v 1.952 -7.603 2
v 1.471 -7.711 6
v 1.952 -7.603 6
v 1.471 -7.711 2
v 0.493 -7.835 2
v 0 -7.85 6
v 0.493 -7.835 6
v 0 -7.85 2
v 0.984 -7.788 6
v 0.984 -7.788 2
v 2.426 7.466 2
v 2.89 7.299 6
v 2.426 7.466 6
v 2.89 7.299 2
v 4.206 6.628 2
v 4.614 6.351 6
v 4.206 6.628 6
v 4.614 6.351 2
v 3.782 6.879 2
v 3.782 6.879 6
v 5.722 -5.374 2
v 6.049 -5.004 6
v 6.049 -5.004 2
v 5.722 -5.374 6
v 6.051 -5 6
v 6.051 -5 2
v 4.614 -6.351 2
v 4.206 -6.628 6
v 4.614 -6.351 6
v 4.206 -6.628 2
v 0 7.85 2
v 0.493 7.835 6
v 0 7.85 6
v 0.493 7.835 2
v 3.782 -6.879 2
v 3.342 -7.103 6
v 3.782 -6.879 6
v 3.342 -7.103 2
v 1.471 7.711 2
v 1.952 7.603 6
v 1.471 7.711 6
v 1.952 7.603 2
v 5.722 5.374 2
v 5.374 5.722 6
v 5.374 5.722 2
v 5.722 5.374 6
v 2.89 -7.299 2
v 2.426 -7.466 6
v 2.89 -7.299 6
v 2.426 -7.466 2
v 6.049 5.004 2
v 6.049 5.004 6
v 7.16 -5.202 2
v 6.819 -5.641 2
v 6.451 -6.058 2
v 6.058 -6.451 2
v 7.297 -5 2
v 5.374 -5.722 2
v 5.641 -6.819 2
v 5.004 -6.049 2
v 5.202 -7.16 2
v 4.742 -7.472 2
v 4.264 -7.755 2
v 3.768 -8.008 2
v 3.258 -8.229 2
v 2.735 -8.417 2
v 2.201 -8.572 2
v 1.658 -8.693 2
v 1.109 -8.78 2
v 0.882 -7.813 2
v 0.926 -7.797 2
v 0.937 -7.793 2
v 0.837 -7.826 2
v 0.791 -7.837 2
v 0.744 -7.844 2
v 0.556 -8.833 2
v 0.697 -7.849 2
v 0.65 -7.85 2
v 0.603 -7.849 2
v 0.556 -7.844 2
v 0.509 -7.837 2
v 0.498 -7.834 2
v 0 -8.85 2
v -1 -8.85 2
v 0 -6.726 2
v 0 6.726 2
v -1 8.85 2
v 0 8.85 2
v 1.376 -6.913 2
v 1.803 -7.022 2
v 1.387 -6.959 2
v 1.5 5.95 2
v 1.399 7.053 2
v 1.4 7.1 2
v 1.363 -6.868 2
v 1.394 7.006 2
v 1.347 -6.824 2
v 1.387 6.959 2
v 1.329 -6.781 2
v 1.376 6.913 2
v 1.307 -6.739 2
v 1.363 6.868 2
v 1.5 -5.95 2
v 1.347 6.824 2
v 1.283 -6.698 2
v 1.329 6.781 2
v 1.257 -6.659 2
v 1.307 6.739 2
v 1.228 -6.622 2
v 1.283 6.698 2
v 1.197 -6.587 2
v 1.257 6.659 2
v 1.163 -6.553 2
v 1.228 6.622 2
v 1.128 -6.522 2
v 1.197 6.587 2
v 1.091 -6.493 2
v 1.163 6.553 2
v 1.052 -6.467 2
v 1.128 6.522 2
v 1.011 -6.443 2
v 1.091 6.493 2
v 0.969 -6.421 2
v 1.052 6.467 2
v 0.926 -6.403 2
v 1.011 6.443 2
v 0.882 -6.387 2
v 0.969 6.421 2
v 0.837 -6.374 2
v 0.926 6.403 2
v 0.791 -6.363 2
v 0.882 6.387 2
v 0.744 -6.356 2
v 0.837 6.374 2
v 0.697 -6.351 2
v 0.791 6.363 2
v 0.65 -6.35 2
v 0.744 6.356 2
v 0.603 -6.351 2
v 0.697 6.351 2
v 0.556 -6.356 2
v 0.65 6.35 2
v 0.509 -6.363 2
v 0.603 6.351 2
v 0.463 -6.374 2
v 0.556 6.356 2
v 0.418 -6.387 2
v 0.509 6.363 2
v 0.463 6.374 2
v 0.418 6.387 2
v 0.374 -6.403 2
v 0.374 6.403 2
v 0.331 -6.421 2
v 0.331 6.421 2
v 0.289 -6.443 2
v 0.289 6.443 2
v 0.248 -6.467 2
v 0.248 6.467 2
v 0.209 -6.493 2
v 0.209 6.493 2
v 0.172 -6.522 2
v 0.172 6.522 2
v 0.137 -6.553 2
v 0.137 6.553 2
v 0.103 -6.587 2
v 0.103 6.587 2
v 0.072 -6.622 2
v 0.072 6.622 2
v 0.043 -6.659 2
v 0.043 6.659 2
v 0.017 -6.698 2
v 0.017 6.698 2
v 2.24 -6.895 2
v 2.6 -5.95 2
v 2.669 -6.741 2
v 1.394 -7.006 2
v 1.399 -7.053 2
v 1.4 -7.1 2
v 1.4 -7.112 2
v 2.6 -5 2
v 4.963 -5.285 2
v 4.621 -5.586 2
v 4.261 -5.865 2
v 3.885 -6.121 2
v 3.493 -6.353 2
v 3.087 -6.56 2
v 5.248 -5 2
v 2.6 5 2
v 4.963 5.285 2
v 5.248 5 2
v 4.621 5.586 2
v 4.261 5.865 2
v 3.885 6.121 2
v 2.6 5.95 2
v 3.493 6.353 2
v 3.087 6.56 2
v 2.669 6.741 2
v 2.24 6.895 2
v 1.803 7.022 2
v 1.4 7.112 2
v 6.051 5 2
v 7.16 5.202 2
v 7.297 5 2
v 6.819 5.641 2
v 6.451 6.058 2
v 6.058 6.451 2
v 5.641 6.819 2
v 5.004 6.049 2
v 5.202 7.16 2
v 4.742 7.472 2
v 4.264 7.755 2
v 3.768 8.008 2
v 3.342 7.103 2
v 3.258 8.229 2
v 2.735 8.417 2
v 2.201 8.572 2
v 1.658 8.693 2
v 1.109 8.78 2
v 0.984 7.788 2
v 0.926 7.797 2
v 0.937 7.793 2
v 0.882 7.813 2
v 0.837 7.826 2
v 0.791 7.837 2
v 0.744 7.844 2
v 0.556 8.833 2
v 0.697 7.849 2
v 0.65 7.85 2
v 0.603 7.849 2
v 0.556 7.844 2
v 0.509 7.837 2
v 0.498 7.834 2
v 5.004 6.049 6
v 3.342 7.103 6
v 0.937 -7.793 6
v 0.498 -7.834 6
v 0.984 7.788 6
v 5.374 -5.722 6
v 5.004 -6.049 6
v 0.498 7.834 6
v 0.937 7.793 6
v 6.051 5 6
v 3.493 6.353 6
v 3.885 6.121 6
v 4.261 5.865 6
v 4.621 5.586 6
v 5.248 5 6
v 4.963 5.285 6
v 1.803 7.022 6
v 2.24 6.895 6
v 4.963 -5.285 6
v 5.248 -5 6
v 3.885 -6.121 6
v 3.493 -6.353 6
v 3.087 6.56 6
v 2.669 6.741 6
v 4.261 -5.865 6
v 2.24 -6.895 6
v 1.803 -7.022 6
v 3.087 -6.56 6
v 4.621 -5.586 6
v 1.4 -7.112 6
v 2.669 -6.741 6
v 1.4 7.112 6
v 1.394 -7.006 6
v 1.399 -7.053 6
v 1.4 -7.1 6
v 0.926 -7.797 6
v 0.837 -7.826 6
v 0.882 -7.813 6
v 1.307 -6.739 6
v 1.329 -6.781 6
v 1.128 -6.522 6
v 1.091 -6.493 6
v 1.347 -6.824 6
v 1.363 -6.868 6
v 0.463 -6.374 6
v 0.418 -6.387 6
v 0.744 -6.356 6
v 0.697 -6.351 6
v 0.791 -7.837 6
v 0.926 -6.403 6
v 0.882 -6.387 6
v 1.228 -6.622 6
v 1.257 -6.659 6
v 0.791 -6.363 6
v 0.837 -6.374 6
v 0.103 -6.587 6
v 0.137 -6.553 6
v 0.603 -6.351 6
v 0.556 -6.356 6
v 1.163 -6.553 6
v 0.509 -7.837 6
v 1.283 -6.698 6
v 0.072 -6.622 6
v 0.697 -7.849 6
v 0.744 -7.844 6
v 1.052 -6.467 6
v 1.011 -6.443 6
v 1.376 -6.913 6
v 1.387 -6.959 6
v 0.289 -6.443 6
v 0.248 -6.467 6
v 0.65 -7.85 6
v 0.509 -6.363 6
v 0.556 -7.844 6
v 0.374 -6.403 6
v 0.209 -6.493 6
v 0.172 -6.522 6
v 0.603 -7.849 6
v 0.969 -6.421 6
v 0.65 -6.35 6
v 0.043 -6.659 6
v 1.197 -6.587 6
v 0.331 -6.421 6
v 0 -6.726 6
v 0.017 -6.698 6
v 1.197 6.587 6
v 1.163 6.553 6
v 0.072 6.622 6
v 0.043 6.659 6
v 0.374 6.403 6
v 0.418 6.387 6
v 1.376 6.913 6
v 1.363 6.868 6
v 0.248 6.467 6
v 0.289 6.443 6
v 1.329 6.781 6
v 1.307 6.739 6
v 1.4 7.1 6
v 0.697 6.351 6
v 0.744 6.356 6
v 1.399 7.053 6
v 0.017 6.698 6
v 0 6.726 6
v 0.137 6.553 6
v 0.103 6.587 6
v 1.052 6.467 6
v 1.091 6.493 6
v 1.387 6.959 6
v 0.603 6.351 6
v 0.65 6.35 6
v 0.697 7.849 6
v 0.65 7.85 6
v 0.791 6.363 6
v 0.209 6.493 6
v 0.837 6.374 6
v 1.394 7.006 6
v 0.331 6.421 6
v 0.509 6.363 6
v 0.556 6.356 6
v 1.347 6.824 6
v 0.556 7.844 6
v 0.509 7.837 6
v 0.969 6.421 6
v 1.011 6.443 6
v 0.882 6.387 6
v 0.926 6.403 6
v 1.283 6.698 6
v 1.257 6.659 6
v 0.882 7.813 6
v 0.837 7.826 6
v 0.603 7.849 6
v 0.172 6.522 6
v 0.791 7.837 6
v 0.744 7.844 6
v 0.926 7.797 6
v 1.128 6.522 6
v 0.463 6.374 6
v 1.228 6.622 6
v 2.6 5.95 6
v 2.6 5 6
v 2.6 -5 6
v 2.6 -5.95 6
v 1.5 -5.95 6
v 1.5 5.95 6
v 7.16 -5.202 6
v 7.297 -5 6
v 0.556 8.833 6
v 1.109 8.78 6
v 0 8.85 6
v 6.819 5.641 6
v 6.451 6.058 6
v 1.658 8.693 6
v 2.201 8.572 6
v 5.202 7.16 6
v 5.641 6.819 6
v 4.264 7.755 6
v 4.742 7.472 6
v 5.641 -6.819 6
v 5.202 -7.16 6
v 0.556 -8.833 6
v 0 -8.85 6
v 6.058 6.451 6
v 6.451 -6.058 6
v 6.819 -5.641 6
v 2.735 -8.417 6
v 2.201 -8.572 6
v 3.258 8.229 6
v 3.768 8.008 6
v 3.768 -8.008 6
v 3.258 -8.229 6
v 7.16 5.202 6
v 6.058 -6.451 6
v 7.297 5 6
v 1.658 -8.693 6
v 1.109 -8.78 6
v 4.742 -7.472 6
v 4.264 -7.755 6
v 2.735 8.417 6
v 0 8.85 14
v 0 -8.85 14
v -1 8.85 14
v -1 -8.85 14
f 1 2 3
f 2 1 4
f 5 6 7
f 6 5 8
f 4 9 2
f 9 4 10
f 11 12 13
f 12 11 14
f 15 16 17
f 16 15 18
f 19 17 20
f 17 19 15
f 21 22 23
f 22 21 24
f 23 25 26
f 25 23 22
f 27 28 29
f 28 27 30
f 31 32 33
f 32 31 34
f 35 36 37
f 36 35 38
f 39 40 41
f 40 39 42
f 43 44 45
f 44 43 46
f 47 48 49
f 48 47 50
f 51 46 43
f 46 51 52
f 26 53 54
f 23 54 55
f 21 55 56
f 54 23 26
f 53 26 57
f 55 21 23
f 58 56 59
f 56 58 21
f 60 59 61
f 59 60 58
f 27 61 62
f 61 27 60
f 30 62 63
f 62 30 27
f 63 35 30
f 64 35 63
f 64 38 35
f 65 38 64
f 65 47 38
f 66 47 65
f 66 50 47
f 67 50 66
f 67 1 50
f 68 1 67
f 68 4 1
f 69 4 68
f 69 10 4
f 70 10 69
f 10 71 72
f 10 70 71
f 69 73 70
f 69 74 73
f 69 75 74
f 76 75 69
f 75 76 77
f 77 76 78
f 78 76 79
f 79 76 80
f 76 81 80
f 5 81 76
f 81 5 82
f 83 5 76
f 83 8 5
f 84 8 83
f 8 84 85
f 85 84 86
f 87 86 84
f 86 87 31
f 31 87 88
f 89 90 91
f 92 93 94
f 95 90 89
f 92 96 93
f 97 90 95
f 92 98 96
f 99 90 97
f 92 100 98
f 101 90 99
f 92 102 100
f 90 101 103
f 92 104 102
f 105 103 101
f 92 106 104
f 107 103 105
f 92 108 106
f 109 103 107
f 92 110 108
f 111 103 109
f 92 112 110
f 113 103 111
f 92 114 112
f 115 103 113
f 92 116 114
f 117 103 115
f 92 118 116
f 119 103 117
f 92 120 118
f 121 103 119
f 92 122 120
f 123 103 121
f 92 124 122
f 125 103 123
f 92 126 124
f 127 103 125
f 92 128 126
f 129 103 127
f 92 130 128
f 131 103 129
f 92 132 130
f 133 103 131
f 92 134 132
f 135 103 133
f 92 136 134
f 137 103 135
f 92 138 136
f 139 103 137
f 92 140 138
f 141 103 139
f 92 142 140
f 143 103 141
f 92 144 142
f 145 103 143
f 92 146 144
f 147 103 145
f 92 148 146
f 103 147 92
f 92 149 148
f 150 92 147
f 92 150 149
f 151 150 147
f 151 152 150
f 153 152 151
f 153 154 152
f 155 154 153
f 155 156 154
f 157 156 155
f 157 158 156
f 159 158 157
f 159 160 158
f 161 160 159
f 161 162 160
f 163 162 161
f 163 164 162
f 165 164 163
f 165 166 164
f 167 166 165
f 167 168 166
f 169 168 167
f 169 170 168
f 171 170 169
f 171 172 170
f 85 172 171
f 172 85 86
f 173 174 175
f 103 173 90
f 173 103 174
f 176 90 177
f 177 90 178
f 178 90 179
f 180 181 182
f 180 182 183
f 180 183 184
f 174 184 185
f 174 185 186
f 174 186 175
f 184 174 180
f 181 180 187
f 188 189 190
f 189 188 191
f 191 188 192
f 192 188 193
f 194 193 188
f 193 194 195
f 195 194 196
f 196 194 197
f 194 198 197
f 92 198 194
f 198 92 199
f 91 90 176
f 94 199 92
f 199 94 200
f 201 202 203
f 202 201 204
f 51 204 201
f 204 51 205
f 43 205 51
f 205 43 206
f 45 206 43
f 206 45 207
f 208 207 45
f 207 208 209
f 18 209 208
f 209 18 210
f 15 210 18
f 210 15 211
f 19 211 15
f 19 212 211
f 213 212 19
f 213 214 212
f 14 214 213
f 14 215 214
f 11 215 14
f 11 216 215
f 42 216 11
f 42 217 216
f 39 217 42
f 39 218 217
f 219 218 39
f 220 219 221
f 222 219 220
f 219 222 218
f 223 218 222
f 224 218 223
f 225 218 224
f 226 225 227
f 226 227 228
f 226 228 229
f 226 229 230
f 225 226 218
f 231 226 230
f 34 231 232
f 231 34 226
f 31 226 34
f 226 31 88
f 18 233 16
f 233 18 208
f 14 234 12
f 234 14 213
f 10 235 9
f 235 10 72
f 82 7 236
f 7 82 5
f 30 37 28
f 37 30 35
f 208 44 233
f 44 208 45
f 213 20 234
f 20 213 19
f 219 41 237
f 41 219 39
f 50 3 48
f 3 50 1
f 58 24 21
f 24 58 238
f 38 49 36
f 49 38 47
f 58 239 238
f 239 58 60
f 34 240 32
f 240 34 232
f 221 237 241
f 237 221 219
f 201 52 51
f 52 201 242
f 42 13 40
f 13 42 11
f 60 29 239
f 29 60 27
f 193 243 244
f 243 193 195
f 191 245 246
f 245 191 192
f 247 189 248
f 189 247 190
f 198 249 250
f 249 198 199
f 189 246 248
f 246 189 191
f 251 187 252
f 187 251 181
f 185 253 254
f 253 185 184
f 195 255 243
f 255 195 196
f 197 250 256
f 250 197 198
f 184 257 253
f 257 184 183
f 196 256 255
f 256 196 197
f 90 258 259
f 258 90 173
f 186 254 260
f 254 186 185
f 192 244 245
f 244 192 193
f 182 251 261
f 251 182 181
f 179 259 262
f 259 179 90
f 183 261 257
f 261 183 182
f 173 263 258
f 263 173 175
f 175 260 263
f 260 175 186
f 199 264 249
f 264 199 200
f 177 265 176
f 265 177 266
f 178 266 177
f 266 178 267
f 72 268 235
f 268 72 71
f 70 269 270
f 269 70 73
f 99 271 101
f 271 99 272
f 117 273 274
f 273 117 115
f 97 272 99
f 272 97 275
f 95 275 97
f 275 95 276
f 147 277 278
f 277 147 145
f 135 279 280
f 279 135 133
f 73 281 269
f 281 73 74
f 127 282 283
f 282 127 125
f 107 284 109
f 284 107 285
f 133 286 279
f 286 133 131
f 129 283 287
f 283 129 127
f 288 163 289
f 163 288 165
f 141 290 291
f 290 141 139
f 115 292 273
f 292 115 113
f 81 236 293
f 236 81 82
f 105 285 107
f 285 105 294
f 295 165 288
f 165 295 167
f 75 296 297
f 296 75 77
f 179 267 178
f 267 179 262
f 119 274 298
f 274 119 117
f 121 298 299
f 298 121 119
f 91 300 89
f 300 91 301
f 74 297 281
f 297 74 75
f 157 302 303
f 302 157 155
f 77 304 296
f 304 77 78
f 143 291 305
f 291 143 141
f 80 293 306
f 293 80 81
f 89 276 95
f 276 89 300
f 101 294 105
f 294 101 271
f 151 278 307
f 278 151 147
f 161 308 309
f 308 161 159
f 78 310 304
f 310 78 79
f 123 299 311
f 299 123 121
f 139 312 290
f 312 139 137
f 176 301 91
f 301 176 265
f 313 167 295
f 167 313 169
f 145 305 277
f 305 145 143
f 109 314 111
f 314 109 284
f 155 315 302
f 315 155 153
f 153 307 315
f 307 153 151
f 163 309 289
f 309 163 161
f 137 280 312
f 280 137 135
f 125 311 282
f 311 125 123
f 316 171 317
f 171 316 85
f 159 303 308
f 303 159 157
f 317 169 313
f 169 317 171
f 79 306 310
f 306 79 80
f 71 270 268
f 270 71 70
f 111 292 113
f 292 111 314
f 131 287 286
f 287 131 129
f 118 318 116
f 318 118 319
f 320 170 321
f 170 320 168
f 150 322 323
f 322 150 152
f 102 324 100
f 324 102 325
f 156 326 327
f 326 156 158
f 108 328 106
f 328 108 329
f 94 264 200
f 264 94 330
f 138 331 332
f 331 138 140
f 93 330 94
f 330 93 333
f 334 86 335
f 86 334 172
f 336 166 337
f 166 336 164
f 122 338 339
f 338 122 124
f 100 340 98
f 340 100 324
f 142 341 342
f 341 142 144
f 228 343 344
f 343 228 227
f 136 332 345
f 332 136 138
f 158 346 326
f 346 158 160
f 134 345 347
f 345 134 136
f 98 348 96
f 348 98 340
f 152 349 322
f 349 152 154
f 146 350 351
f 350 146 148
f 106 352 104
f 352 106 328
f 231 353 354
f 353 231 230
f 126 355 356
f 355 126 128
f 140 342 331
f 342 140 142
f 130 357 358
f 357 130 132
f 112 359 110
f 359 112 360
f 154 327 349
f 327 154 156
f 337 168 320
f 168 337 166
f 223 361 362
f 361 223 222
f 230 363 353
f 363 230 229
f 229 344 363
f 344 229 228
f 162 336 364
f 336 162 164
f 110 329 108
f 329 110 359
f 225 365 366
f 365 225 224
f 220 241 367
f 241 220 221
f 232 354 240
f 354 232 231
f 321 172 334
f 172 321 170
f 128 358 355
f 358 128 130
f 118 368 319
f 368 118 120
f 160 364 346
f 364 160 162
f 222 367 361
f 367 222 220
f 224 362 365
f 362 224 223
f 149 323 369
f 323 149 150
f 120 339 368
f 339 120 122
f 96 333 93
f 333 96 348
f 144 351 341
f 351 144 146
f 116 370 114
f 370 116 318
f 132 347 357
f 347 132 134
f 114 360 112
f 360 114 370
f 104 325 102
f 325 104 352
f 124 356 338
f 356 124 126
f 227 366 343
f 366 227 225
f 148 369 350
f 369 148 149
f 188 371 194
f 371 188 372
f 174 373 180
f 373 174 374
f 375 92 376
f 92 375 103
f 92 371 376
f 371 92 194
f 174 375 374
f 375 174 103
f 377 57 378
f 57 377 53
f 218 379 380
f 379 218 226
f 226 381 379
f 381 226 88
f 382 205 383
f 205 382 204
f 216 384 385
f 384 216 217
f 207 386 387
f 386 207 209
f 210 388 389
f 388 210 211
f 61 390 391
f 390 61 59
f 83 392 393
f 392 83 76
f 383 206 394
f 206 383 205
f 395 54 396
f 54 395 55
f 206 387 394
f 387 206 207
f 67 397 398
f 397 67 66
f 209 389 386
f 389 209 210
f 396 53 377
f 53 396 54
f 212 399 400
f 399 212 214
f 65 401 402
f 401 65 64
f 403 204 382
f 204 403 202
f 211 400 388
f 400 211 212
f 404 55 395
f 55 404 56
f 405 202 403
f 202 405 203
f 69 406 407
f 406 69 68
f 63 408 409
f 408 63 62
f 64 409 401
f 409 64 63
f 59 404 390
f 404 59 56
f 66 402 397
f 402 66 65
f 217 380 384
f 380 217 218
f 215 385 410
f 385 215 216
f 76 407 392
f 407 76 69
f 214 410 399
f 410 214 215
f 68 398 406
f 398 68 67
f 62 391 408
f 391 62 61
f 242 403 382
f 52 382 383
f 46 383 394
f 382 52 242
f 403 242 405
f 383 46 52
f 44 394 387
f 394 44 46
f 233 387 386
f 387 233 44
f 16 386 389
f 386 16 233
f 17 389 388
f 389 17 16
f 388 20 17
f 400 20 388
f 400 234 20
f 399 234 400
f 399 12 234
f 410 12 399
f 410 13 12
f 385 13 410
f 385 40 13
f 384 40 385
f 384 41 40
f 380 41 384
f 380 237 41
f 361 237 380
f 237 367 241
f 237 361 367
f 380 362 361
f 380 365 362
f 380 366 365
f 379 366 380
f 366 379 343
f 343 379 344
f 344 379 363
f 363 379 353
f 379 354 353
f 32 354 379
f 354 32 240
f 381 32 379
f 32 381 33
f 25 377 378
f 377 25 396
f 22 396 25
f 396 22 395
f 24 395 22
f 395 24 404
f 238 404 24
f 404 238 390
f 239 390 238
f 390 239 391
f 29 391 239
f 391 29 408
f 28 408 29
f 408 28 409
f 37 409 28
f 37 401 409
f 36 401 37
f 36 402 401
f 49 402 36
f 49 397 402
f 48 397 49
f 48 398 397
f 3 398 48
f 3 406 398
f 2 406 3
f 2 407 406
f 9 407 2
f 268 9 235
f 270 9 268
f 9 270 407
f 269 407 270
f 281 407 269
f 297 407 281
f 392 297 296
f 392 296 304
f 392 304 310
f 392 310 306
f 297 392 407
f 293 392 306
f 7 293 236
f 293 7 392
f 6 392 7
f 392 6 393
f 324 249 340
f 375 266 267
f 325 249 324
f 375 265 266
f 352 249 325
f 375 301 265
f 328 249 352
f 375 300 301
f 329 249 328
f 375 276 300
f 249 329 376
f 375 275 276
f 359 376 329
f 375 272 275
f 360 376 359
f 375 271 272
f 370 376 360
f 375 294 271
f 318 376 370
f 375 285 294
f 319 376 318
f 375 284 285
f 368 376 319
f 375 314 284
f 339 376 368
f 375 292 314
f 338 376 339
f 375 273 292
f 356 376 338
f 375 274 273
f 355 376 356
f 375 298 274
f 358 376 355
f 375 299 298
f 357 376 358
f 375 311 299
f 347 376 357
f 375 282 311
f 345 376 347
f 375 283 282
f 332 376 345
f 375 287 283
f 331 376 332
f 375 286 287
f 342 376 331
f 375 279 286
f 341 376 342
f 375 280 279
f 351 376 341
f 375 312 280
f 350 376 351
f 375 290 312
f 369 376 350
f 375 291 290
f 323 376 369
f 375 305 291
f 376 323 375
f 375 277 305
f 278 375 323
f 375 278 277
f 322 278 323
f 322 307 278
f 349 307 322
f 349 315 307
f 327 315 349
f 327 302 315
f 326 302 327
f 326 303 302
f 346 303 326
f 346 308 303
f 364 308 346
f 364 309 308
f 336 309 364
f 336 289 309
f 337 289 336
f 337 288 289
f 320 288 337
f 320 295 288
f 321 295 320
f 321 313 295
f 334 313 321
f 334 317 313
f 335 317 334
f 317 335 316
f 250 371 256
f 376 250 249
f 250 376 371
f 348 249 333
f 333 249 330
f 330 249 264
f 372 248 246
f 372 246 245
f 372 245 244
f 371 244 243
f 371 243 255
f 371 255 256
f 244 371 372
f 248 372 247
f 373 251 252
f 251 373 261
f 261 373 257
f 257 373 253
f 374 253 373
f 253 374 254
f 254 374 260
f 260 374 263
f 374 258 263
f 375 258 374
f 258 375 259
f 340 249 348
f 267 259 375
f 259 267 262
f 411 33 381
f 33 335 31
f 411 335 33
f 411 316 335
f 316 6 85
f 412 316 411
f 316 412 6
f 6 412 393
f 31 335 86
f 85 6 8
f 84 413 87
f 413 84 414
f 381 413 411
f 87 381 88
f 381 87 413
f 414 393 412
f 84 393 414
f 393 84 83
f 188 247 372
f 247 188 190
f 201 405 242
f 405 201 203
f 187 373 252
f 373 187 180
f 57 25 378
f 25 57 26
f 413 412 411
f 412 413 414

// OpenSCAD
$fn=100;
ledBoardY = 11.9;
ledBoardX = 1.1;
ledBoardXoffset = 1.5;

wireY = 6.8;
wireX = 2;

cacheDiam = 15.7;
cacheThick = 1.2;
cacheEdgeDiam = 1.5;

bottomZ = 6;
bottomY = cacheDiam + 2;

backPlate = 1;

baseZ = 6;

/*
rampWireBottom();
translate([0, 30, 0])
  rampBottom();
*/
rampMiddle();

module rampMiddle() {
  ledY = 10;
  difference() {
    rampBottom();
    translate([ledBoardXoffset + ledBoardX, -ledY/2, 0])
      cube([10, ledY, 10]);
    translate([-6, -10, 0])
      cube([20, 20, 2]);
    translate([-6, -10, 14])
      cube([20, 20, 20]);
  }
}

module base() {
  smoother = 10;
  baseY = cacheDiam + 2 + smoother;
  difference() {
    cylinder(d=baseY, h=baseZ);
    removedHalf();
    translate([0, 0, baseZ])
      rotate_extrude(convexity = 10)
        translate([(baseY)/2, 0, 0])
          circle(d = smoother);
    wirePassage();
  }
  backPlate(bottomY, baseZ);
}

module rampWireBottom() {
  base();
  translate([0, 0, baseZ])
    difference() {
      rampBottom();
      wirePassage();
    }
}

module wirePassage() {
    translate([ledBoardXoffset + ledBoardX, -wireY/2, 0])
      cube([wireX, wireY, 10]);
}

module rampBottom() {
  difference() {
    cylinder(d=cacheDiam + 2, h=bottomZ);
    removedHalf();
    translate([0, 0, 2]) {
      cacheSlot(bottomZ);
      // led board slot
      translate([ledBoardXoffset, -ledBoardY/2])
        cube([ledBoardX, ledBoardY, 10]);
    }
  }
  backPlate(cacheDiam + 2, 20);
}

module removedHalf() {
    translate([-20, -20, 0])
      cube([20, 40, 20]);
}
module backPlate(y, z) {
  translate([-backPlate, -y/2, 0])
    cube([backPlate, y, z]);
}
module cacheSlot(height) {
  difference() {
    cylinder(d=cacheDiam, h=height);
    cylinder(d=cacheDiam - cacheThick, h=height);
  }
  translate([cacheEdgeDiam/2 - 0.1, -cacheDiam/2 + cacheEdgeDiam/2, 0])
    cylinder(d=cacheEdgeDiam, h=height);
  translate([cacheEdgeDiam/2 - 0.1, cacheDiam/2 - cacheEdgeDiam/2, 0])
    cylinder(d=cacheEdgeDiam, h=height);
}
